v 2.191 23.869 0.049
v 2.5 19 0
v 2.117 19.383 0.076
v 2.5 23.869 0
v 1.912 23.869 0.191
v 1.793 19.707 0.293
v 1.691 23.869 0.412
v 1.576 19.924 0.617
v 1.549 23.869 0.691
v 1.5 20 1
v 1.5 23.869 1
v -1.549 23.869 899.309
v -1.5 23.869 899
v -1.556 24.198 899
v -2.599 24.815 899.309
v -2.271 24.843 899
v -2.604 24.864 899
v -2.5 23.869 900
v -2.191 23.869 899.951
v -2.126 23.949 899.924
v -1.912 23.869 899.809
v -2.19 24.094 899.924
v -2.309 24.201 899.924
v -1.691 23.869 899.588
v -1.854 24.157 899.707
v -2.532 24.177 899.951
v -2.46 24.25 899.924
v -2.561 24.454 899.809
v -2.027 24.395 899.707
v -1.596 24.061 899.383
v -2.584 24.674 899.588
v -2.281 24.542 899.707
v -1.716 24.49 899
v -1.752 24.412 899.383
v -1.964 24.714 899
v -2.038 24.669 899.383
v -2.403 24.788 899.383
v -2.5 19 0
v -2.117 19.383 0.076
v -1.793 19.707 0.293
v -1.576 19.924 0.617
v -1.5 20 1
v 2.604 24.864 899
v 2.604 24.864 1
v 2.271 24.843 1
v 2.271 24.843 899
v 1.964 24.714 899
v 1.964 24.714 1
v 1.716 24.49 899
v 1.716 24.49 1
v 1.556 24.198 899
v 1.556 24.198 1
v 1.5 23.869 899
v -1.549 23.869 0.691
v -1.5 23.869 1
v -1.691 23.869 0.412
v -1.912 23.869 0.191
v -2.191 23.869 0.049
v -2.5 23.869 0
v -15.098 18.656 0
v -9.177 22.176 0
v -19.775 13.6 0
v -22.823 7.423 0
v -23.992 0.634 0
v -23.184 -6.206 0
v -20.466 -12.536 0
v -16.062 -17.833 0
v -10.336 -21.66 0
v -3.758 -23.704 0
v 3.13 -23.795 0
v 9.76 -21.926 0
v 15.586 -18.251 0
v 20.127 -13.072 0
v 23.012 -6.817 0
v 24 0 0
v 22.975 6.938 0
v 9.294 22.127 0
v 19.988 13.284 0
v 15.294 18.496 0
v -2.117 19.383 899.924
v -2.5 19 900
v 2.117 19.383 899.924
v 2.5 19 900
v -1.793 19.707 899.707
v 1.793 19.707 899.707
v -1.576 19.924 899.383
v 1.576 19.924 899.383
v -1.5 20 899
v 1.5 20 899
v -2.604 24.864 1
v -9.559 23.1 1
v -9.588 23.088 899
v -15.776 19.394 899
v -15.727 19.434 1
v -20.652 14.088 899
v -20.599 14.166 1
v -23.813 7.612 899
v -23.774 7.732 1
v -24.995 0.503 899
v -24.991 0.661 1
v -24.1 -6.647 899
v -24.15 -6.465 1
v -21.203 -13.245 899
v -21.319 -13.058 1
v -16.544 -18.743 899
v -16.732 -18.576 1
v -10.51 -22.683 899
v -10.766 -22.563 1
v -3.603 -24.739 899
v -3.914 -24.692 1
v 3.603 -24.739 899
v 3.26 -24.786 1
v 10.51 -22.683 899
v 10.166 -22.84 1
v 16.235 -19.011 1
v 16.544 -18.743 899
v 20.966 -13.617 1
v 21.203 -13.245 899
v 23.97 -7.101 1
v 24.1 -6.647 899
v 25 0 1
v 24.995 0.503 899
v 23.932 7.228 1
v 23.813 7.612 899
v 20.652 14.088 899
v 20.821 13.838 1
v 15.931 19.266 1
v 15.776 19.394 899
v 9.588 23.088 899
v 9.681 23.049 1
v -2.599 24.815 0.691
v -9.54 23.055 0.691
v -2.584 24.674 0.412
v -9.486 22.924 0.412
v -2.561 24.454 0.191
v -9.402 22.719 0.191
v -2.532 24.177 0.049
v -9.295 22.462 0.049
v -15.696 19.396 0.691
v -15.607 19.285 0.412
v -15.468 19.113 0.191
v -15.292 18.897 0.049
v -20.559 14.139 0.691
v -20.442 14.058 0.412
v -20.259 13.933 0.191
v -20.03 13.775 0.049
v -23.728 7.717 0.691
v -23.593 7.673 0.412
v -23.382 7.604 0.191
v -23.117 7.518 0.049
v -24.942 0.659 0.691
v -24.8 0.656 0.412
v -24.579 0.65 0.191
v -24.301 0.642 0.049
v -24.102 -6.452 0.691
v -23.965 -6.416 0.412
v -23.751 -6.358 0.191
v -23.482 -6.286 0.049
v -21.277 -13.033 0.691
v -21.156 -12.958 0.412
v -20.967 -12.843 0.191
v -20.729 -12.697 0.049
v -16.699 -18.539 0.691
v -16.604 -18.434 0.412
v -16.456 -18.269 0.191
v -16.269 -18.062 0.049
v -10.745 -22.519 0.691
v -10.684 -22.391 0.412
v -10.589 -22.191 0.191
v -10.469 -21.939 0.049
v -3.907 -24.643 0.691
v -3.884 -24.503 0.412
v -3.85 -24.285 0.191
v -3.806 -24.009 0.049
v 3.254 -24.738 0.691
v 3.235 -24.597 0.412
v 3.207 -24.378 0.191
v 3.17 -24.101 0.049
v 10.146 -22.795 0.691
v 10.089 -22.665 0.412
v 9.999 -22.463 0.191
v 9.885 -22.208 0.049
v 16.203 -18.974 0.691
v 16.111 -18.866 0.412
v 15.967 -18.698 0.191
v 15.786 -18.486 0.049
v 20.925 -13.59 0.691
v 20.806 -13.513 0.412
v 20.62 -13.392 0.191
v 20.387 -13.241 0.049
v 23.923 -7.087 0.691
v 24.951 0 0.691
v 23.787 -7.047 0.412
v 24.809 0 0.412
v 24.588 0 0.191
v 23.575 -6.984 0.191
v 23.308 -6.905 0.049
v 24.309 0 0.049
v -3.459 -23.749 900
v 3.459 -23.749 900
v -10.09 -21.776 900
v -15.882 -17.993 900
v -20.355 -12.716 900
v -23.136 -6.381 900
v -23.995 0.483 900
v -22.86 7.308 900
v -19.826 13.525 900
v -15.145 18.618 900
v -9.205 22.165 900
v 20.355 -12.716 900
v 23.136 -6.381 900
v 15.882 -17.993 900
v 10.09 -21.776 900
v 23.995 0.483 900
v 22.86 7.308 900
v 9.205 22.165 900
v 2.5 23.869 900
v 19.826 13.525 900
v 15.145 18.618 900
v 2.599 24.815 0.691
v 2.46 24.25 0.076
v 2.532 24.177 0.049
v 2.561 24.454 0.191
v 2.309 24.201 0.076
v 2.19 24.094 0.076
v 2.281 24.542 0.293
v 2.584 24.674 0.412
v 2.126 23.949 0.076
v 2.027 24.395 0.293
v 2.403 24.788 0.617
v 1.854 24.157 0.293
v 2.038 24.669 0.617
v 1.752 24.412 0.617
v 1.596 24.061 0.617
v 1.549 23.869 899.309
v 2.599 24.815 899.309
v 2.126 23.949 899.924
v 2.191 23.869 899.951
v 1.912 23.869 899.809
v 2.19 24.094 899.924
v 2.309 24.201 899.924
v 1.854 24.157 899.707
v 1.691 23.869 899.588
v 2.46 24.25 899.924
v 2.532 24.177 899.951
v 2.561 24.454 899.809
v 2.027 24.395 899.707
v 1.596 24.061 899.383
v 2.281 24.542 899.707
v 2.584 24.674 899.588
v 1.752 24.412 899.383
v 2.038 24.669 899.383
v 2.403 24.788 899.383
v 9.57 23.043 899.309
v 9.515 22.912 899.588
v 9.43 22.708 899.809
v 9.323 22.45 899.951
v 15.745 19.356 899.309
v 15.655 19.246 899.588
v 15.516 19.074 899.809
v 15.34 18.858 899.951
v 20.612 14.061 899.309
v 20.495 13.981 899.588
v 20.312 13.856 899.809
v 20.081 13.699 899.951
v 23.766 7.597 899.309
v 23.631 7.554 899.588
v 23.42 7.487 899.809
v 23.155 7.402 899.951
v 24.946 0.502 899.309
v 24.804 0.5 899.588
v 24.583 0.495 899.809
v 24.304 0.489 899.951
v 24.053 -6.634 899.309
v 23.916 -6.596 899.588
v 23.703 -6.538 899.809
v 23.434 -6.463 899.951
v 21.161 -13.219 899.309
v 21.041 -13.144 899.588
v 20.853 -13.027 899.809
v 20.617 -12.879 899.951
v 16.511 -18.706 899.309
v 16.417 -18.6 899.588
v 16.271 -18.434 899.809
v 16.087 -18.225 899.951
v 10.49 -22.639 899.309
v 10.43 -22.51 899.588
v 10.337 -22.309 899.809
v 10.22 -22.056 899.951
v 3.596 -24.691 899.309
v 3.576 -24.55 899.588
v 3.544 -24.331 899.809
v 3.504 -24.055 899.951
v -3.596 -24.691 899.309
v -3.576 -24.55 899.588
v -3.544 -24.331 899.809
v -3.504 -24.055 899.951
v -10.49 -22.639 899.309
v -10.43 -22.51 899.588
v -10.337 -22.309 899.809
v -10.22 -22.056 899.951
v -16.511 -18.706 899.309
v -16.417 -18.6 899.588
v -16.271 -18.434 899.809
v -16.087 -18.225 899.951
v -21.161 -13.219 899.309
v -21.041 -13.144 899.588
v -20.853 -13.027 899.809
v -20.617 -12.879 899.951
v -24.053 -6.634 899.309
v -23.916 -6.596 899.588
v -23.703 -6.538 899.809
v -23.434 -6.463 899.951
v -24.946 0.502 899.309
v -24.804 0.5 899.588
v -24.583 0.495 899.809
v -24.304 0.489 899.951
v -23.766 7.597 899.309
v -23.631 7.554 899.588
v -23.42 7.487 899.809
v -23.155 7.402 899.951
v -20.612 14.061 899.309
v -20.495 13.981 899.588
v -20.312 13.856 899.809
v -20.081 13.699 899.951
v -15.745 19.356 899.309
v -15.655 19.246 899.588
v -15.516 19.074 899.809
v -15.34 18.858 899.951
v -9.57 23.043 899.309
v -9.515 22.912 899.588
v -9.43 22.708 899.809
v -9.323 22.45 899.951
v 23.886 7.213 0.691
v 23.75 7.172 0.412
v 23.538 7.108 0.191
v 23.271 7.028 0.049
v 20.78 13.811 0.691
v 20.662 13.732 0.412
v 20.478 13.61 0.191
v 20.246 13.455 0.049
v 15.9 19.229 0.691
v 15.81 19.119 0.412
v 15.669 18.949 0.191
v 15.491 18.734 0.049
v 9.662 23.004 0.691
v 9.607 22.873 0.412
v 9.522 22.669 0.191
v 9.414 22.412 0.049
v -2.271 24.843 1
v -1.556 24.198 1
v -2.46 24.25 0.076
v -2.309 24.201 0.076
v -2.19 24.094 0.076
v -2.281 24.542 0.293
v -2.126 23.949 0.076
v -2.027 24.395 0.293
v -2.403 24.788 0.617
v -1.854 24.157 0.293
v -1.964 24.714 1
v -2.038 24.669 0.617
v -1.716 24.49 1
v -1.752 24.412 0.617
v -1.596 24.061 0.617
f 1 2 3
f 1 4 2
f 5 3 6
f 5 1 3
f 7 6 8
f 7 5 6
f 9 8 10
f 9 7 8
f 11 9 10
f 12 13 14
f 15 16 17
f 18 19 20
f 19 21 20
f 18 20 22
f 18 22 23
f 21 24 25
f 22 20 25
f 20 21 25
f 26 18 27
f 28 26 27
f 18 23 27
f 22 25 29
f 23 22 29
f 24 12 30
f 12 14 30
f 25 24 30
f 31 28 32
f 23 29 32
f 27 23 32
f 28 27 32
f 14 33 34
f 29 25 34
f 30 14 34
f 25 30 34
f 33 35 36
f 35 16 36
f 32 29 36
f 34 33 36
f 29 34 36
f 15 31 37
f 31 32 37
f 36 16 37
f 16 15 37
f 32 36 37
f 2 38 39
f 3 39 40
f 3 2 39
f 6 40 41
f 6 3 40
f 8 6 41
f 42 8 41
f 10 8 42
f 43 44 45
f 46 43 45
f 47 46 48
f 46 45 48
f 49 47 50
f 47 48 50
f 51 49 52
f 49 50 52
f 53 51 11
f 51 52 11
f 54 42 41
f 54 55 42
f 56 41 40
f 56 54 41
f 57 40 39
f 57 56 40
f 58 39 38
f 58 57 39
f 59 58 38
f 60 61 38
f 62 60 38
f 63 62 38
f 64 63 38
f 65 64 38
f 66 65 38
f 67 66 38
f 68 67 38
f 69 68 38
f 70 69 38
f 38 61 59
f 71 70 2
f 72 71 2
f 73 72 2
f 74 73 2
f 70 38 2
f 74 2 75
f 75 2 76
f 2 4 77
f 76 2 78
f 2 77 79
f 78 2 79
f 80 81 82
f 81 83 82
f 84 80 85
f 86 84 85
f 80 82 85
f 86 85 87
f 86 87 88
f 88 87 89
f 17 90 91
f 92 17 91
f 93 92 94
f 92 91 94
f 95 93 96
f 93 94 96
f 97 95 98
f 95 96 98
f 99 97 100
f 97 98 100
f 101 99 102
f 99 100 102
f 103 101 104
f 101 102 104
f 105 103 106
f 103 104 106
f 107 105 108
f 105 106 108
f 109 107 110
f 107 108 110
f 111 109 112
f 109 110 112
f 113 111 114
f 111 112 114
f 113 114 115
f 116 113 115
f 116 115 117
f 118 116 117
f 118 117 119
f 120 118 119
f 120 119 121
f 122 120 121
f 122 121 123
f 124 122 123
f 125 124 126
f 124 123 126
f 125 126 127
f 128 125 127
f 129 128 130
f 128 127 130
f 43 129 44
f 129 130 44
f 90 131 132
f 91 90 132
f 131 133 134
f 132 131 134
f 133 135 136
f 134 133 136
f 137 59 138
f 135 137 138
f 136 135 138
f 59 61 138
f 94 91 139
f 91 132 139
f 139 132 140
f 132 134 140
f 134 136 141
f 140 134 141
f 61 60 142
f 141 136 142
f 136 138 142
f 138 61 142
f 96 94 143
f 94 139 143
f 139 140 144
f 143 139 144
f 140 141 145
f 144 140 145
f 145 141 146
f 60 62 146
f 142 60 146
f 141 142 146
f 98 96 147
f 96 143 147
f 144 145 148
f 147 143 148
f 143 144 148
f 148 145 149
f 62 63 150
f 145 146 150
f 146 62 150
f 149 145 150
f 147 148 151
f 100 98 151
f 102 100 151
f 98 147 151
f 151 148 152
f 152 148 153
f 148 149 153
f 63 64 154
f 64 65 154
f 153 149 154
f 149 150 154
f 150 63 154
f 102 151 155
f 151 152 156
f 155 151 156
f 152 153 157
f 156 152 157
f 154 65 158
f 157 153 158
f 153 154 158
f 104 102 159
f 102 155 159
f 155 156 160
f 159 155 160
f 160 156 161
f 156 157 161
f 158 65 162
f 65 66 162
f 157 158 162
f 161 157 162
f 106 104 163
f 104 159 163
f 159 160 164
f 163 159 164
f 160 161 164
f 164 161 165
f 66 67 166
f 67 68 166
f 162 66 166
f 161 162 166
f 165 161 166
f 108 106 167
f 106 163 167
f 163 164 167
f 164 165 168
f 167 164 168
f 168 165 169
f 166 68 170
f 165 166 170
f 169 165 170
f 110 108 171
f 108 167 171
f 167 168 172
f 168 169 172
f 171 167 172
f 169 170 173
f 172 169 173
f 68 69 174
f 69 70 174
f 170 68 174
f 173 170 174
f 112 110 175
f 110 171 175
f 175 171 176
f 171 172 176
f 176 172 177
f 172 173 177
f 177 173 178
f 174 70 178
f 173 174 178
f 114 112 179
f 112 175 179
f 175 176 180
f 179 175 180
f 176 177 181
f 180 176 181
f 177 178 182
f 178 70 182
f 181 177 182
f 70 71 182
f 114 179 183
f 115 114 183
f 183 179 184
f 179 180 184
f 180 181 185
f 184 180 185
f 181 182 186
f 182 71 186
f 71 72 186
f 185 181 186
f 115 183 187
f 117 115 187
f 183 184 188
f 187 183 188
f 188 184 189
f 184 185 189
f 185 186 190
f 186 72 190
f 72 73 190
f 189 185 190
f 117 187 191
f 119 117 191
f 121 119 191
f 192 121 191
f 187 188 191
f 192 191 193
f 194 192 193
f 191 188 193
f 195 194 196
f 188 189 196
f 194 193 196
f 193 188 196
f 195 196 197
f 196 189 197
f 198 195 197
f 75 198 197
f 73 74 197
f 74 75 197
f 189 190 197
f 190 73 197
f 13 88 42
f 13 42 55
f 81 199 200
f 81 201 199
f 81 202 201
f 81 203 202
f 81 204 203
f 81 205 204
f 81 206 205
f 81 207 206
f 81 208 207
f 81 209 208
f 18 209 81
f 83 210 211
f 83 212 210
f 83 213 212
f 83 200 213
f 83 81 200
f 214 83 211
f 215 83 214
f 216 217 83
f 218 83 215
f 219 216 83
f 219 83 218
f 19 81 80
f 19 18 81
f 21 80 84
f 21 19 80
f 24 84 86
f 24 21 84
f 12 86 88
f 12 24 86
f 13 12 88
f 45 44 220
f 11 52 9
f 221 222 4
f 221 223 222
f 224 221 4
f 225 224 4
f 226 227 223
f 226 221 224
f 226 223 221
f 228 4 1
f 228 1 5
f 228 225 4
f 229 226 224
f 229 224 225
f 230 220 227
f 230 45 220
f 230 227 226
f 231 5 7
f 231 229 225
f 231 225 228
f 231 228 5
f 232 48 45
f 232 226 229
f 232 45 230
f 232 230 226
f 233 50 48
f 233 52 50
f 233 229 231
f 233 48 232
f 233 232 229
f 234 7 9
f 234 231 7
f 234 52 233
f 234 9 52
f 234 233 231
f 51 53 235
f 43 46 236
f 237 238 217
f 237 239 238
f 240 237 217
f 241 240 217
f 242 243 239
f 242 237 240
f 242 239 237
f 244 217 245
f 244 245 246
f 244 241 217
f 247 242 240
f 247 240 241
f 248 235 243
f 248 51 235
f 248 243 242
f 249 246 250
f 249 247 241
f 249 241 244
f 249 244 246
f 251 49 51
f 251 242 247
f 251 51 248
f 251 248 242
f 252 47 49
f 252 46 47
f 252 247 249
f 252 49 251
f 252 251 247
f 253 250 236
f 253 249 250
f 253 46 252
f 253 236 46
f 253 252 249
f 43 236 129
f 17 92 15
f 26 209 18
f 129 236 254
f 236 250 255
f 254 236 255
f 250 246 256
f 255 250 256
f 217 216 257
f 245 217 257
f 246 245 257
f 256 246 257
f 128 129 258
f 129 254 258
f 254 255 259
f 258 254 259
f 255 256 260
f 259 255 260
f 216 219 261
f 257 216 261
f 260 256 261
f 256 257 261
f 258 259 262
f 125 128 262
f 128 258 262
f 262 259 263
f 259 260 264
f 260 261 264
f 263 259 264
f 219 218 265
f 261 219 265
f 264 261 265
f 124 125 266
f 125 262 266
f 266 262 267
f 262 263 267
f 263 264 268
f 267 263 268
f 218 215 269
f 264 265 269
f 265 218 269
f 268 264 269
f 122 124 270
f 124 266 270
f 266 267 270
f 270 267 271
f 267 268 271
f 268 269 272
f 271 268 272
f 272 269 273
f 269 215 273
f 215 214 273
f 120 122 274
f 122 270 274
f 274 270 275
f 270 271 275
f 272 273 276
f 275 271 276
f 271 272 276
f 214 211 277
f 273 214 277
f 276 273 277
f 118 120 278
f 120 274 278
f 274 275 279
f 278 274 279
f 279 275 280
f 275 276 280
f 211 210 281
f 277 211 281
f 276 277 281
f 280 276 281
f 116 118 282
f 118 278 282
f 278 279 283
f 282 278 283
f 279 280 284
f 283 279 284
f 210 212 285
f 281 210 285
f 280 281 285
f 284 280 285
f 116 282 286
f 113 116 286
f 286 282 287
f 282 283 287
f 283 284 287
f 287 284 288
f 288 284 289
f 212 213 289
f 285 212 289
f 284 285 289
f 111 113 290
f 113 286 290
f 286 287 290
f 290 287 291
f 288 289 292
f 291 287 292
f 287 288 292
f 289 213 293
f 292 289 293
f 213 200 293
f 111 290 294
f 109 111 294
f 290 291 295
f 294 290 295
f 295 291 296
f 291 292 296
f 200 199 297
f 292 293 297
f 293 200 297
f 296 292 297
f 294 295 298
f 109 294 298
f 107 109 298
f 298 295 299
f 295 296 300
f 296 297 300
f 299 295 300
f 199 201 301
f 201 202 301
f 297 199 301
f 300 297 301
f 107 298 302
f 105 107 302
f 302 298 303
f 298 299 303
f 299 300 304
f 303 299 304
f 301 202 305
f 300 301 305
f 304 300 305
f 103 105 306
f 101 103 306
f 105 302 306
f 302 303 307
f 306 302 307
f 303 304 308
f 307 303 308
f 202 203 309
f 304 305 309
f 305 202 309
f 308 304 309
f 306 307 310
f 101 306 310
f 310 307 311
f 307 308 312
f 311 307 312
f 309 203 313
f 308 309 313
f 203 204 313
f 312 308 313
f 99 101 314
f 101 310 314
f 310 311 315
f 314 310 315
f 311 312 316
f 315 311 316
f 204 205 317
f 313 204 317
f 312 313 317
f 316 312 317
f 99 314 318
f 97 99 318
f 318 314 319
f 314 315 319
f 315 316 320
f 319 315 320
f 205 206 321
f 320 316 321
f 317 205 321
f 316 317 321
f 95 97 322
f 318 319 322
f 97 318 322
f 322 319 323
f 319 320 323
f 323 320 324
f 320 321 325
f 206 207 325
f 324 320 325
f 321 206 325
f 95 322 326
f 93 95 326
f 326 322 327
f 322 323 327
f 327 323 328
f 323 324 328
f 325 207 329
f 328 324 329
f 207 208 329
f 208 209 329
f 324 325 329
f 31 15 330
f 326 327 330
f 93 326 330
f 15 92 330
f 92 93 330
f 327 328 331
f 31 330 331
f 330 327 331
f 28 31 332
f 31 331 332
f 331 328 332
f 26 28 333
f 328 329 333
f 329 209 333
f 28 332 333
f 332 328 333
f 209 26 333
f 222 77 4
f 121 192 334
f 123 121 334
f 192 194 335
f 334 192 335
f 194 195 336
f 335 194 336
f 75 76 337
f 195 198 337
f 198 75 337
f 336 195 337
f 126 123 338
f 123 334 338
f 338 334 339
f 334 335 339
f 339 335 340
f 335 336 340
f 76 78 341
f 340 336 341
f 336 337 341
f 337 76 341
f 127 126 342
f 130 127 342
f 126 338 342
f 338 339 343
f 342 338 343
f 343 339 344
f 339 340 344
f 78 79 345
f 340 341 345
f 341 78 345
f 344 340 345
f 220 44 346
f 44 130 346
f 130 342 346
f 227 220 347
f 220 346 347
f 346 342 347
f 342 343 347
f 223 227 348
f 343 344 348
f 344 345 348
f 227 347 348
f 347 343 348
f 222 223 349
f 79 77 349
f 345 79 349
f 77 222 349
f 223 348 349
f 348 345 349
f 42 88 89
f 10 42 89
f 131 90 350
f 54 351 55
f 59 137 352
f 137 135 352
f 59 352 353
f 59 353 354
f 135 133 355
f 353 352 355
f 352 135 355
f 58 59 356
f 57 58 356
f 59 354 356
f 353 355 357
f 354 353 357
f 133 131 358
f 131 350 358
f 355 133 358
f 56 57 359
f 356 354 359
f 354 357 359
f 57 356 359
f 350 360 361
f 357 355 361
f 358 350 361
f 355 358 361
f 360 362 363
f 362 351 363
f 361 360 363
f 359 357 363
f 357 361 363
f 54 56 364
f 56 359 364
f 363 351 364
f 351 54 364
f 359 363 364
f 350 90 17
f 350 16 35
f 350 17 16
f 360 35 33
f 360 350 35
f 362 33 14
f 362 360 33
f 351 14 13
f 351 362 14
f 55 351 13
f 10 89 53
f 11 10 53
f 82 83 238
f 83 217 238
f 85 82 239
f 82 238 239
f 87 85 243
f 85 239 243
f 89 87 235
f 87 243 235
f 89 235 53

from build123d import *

# Parameters (mm, degrees)
SKETCH1_R               = 25
BOSS_EXTRUDE1_DEPTH     = 900
SKETCH2_W               = 3
SKETCH2_H               = 10
CUT_EXTRUDE1_DEPTH      = 1
CUT_EXTRUDE1_DEPTH_BACK = 901
FILLET1_R               = 1


with BuildPart() as part:
    # Sketch1 → Boss-Extrude1 (new body)
    with BuildSketch(Plane.XY):
        Circle(SKETCH1_R)
    extrude(amount=BOSS_EXTRUDE1_DEPTH)

    # Sketch2 → Cut-Extrude1 (cut, two sides)
    with BuildSketch(Plane.XY.offset(900)) as cut_extrude1_sk:
        with Locations((0, 25)):
            Rectangle(SKETCH2_W, SKETCH2_H)
    extrude(amount=CUT_EXTRUDE1_DEPTH, mode=Mode.SUBTRACT)
    extrude(cut_extrude1_sk.sketch, amount=-CUT_EXTRUDE1_DEPTH_BACK, mode=Mode.SUBTRACT)

    # Fillet1
    fillet1_edges = [part.edges().sort_by_distance(p)[0] for p in [
        (1.5, 22.477479713, 900),
        (0, 20, 0),
        (-1.5, 22.477479713, 900),
        (-17.139136501, -18.200274723, 0),
        (-1.5, 22.477479713, 0),
        (-17.139136501, -18.200274723, 900),
        (1.5, 22.477479713, 0),
        (1.5, 24.954959427, 450),
        (0, 20, 900),
        (-1.5, 24.954959427, 450),
    ]]
    fillet(fillet1_edges, radius=FILLET1_R)


solid = part.part
